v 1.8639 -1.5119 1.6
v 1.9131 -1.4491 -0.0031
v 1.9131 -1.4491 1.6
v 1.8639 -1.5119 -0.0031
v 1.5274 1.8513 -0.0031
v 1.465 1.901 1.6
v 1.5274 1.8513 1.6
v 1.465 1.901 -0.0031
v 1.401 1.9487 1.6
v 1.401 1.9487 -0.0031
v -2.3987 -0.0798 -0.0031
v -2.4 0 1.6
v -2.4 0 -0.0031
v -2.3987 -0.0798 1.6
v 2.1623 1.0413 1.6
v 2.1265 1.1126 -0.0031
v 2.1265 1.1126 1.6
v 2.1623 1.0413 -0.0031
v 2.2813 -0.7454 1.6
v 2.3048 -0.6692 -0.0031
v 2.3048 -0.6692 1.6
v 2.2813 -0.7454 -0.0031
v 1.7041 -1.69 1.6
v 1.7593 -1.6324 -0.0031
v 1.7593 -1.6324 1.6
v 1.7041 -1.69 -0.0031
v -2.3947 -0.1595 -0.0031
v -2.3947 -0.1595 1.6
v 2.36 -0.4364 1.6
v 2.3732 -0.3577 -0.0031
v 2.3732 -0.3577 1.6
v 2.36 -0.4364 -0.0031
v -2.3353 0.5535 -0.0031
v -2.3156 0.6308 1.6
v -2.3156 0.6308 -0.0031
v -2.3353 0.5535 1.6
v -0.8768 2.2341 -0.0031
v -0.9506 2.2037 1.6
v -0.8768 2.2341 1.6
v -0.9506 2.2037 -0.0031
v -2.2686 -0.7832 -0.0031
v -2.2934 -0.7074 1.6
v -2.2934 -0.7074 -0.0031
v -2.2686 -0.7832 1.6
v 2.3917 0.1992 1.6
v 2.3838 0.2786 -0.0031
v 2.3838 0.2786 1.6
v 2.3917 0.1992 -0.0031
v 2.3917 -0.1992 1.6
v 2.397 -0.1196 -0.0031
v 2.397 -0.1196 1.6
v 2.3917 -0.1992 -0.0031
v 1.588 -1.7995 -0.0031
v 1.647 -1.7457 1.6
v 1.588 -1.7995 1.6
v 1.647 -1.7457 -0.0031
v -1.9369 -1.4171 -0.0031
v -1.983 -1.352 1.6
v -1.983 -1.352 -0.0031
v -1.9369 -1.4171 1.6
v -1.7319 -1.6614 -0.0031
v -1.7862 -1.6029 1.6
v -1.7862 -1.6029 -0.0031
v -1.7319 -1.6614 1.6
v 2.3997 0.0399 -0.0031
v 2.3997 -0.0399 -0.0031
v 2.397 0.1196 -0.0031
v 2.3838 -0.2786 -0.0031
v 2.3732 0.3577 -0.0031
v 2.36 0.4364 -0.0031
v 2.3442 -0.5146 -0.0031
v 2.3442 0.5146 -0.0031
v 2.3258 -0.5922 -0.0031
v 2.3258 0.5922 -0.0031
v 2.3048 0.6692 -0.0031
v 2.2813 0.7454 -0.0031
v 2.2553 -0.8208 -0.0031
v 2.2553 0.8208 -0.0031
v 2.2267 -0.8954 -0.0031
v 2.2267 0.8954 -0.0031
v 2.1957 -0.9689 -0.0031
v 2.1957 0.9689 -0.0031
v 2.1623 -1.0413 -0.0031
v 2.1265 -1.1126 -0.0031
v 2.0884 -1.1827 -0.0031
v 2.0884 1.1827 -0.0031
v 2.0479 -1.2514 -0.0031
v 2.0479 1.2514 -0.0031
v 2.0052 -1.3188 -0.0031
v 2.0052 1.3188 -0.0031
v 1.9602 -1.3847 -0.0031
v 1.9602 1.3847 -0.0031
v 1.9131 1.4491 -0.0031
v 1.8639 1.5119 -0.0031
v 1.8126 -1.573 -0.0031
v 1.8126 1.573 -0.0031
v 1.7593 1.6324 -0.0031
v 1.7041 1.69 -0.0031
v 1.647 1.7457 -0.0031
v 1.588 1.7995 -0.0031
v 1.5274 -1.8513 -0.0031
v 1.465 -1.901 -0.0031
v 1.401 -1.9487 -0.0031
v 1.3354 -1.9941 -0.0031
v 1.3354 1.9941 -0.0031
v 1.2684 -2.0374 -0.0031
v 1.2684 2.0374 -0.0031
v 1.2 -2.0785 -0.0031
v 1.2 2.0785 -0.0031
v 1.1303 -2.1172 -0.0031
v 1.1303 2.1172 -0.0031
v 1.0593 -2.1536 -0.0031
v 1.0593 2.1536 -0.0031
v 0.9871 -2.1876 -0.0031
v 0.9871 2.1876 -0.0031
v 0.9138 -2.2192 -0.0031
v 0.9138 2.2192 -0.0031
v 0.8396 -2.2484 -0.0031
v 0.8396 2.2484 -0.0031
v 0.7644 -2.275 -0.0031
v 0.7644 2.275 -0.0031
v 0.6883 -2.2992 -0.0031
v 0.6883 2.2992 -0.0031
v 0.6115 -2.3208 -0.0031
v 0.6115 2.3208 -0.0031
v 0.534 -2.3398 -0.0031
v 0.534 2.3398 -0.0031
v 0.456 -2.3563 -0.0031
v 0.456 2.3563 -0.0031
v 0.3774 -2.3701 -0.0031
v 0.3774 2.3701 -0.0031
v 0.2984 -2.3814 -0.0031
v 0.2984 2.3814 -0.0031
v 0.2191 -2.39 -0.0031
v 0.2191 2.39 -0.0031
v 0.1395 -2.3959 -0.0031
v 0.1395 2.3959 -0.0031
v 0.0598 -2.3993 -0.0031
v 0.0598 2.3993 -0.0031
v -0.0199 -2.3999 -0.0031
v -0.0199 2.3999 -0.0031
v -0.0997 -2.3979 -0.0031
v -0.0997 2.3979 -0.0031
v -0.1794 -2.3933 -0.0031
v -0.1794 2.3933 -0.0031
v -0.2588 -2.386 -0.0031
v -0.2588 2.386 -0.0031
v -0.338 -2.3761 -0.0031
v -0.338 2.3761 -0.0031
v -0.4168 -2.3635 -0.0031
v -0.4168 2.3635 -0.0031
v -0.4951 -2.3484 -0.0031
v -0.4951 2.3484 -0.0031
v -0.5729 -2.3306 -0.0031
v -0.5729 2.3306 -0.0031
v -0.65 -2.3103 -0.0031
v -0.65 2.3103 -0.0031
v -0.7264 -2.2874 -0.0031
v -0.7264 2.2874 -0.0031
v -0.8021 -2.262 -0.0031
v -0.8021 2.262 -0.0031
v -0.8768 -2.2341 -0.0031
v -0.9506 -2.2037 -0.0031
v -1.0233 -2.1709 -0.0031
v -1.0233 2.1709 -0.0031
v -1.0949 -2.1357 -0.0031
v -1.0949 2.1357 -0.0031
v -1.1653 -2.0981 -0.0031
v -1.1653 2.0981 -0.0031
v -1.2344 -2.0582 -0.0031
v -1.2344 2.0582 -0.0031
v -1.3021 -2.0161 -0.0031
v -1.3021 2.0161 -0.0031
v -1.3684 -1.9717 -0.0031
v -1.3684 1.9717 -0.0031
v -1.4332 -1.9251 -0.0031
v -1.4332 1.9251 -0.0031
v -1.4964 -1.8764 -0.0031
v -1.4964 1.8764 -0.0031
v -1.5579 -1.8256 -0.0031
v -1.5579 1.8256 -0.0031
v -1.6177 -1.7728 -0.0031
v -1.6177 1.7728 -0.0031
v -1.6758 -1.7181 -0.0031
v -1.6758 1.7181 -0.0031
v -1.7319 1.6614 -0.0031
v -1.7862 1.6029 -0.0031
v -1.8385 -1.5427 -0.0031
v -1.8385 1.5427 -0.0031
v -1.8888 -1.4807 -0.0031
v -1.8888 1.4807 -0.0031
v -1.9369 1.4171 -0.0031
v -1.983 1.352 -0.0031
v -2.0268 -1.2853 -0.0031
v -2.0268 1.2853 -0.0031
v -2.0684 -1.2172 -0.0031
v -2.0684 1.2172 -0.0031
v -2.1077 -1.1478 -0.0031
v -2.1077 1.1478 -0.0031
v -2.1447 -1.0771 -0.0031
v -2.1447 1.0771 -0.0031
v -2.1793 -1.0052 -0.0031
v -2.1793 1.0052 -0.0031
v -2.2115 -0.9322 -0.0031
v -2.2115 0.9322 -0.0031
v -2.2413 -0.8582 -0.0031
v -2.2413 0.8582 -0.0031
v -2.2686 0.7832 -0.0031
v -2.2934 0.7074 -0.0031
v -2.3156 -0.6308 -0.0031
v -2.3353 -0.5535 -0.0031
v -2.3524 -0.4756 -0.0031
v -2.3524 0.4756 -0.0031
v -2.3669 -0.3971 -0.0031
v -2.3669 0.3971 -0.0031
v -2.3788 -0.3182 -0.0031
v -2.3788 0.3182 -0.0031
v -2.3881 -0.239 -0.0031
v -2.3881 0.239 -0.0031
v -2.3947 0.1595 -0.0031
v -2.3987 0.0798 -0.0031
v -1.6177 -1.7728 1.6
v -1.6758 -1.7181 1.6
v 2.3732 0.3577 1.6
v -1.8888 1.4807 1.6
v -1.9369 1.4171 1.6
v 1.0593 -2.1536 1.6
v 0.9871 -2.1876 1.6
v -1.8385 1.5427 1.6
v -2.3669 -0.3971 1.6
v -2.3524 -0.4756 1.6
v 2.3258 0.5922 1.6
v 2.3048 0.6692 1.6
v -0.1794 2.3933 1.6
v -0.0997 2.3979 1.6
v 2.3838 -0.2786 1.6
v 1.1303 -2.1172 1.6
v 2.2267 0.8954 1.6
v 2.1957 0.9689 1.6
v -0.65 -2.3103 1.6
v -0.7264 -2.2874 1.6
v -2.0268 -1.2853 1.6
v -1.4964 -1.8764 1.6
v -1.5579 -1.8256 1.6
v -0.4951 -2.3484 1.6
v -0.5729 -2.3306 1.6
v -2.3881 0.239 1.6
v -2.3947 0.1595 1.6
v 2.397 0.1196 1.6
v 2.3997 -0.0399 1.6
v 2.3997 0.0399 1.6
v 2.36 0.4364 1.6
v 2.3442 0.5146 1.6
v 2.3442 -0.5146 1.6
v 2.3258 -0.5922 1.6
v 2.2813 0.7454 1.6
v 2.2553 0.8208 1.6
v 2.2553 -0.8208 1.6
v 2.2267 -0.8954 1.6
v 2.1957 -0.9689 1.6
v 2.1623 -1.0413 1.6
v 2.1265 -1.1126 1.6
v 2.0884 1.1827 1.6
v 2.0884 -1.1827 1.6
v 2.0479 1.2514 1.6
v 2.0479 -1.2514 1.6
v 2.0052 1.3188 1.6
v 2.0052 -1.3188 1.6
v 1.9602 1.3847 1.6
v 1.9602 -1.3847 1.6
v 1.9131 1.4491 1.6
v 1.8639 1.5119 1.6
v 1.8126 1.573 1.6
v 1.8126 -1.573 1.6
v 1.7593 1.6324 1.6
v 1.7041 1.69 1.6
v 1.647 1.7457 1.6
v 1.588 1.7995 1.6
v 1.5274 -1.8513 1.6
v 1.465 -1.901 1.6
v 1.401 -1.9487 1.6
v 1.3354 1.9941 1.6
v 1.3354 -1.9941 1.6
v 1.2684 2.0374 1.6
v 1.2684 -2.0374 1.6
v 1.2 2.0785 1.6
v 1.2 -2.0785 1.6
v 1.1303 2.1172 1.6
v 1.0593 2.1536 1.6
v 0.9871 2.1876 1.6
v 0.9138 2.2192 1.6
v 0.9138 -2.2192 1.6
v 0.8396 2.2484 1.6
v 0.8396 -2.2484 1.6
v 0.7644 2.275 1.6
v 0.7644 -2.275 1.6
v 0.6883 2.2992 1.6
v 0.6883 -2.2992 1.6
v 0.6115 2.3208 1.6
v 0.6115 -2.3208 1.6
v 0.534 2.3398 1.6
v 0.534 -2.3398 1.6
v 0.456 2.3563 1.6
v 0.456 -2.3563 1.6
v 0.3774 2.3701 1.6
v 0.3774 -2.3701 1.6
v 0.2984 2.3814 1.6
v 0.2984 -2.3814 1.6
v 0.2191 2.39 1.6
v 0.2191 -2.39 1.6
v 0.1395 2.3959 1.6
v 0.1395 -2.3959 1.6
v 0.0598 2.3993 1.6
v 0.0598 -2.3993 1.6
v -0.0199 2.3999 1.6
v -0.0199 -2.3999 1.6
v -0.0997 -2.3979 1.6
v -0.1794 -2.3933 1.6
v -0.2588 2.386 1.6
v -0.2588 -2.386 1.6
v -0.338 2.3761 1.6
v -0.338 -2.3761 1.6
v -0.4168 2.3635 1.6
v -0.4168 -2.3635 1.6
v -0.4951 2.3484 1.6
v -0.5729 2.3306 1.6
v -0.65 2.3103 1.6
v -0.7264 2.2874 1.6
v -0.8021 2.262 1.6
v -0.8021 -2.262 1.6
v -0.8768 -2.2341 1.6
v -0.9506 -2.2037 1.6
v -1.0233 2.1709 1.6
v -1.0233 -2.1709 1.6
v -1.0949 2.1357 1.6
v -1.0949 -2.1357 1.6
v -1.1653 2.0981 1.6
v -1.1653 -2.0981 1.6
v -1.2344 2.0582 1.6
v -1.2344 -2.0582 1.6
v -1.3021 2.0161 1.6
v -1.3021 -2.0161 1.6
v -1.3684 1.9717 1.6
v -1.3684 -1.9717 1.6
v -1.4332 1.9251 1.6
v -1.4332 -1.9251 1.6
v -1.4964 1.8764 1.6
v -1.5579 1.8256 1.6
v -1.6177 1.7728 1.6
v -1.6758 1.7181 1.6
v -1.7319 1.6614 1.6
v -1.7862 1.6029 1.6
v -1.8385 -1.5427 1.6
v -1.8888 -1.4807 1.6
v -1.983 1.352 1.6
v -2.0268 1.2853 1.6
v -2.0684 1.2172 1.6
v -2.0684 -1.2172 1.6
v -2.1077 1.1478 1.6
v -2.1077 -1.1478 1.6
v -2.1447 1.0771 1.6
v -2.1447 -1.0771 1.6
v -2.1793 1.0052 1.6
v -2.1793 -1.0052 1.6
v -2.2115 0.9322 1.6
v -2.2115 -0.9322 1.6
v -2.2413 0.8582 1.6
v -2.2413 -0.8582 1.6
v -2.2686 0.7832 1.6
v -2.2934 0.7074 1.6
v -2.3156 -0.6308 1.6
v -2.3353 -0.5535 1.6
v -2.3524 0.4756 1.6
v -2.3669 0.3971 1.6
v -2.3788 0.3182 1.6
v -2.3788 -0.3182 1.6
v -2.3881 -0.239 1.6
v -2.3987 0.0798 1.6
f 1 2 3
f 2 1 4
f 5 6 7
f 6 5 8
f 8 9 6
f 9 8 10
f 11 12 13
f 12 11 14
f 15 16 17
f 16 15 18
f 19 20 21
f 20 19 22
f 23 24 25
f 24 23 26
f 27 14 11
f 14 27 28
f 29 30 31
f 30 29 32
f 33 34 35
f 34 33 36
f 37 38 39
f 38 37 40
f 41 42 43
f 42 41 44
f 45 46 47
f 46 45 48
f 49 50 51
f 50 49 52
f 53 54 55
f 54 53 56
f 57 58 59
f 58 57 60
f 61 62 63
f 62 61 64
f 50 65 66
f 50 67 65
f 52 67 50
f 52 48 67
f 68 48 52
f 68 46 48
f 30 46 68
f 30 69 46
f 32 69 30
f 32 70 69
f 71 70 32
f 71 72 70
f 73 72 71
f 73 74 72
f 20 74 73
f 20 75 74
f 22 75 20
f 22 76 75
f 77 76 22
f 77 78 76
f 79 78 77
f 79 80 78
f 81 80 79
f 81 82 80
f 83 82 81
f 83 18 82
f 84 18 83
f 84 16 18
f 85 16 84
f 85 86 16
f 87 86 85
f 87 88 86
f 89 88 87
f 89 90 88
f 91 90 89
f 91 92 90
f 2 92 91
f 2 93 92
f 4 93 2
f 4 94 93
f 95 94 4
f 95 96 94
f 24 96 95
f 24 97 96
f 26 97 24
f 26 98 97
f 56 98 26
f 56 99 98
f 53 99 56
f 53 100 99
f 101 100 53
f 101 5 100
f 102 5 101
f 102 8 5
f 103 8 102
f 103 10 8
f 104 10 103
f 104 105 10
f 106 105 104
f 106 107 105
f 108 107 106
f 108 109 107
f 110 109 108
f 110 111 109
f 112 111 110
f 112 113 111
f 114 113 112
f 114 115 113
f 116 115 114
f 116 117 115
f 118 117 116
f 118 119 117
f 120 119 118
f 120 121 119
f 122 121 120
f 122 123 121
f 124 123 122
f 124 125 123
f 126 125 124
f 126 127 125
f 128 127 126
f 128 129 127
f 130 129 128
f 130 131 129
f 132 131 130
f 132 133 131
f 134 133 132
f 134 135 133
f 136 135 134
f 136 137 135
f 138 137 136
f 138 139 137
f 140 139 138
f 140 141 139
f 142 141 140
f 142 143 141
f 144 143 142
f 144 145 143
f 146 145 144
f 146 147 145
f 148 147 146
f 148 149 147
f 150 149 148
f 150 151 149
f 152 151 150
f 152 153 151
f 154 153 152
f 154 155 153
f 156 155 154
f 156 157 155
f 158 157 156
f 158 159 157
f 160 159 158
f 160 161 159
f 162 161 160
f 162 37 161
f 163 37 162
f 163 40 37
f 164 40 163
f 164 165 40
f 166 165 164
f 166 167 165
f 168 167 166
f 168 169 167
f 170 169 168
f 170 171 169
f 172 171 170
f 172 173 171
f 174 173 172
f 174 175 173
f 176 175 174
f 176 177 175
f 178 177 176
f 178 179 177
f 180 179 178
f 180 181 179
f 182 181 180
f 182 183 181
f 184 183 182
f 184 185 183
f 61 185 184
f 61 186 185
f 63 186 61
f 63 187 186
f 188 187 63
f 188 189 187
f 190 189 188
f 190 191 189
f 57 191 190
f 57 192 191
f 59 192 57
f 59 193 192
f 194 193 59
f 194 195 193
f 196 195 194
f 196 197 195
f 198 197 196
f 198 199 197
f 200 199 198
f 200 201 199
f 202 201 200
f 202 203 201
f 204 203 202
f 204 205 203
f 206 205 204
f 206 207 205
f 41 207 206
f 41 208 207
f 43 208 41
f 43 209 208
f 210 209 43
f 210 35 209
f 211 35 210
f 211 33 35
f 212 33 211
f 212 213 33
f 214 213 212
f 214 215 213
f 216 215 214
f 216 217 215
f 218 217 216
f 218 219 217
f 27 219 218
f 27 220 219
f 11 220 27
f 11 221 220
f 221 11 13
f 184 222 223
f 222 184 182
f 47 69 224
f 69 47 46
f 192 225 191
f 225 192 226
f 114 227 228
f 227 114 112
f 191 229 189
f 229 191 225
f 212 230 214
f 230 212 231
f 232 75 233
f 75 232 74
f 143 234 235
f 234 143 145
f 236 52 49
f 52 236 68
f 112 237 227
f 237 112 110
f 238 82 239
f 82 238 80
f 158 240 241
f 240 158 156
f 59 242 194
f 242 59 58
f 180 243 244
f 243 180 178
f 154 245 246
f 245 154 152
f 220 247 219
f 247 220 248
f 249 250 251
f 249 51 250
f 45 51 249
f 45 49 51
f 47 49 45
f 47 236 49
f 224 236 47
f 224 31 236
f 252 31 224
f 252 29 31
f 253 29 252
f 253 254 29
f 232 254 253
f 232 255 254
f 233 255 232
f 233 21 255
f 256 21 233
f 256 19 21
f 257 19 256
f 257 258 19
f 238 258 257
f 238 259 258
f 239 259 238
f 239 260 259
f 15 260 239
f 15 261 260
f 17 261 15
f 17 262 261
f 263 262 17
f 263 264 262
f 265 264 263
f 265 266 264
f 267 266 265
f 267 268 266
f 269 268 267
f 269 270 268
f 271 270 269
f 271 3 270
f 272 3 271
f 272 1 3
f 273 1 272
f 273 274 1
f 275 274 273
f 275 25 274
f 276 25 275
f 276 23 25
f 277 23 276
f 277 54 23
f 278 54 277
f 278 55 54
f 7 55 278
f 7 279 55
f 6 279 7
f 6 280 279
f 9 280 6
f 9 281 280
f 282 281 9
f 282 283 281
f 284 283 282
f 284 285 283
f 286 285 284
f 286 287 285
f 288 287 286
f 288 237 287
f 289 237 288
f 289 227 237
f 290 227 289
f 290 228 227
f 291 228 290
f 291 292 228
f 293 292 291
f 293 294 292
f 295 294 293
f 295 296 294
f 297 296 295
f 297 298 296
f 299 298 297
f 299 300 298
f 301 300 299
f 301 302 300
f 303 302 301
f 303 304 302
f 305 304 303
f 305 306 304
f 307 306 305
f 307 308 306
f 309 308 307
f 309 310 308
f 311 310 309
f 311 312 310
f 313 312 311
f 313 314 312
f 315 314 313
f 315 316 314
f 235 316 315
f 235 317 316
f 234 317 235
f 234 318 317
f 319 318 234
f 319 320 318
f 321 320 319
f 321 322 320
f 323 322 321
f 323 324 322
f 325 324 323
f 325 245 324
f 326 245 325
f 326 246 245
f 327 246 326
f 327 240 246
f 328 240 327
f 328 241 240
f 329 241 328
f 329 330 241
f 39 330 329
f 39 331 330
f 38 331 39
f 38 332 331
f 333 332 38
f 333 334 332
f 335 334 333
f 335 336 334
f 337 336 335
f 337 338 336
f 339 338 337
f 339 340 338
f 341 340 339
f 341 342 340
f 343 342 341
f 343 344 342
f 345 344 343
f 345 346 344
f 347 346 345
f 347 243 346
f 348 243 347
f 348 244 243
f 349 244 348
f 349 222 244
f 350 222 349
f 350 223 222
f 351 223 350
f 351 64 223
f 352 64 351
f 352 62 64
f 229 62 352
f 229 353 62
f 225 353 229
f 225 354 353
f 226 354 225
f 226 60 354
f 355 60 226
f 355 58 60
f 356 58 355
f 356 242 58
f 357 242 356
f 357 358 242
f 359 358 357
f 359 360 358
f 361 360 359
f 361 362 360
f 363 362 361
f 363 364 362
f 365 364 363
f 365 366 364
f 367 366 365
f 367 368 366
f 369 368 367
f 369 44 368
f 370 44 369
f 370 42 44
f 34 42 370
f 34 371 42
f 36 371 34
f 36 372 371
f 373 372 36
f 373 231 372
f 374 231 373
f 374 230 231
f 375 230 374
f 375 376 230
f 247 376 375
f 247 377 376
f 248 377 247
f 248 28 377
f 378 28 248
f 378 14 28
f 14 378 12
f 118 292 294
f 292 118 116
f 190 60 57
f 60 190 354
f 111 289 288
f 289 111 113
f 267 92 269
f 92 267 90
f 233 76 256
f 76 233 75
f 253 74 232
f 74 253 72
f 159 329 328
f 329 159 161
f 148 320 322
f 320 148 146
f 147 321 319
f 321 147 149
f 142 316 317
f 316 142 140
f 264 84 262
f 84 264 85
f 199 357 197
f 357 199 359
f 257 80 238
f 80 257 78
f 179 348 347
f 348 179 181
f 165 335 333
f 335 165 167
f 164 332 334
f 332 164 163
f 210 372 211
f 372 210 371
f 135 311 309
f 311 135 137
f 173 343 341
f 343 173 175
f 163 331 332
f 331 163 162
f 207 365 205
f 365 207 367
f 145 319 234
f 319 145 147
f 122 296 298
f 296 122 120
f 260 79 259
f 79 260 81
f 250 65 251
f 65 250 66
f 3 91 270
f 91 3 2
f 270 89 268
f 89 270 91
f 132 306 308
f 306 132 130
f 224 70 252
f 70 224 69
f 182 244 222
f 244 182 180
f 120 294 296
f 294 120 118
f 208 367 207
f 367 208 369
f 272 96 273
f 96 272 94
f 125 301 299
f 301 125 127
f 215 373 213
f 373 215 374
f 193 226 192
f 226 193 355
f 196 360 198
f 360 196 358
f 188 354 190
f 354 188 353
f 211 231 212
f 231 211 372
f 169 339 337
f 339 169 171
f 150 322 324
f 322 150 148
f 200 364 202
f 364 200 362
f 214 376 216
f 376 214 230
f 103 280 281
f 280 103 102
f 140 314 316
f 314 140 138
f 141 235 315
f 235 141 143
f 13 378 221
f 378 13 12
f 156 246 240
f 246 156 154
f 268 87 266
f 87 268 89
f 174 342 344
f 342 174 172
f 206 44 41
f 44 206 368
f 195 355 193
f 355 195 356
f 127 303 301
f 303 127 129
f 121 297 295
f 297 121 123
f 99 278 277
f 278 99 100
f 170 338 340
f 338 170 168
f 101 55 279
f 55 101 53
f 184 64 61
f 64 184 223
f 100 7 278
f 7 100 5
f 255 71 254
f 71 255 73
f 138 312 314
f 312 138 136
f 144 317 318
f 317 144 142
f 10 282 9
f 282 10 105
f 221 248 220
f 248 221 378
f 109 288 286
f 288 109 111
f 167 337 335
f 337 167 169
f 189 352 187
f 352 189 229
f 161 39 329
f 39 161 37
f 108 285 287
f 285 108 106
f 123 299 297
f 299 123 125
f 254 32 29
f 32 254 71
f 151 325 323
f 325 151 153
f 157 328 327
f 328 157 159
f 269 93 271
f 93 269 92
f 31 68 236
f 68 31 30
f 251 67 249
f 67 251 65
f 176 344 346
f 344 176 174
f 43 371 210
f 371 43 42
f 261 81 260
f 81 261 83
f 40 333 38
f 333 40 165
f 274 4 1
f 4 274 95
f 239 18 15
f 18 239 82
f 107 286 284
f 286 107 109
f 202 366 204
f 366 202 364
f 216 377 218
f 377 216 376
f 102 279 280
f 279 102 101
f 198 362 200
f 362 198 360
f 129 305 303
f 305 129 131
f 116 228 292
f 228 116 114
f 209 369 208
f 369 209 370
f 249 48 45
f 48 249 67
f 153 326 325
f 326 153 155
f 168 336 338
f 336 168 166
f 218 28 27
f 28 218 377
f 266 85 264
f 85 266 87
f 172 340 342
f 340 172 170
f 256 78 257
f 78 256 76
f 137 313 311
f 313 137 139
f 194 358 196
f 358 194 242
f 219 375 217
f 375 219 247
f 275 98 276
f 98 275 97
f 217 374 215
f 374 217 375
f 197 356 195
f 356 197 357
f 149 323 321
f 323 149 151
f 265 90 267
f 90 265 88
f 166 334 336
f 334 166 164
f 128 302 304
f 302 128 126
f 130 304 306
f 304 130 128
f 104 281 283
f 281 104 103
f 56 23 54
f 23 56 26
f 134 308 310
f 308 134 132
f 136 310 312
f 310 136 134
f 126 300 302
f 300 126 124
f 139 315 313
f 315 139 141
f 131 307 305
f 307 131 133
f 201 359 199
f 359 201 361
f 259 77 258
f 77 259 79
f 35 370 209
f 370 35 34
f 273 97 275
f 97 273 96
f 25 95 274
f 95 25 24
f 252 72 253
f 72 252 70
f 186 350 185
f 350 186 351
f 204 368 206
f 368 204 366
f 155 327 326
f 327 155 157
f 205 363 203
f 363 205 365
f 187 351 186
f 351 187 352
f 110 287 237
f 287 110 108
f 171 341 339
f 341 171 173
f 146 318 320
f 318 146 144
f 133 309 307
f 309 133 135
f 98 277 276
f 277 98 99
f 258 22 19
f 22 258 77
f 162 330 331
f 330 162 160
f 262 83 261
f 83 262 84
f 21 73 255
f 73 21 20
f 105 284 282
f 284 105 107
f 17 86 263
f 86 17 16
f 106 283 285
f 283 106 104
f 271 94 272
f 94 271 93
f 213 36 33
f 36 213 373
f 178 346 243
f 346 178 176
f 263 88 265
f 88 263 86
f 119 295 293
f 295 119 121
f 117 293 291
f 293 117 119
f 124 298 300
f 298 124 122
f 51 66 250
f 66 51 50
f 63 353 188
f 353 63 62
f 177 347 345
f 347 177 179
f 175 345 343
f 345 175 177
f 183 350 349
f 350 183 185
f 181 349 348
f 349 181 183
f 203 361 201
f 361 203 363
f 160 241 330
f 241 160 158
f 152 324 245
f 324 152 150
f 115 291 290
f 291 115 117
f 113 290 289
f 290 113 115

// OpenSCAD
use <../lib.scad>
use <../p/box2-5.scad>
use <../p/box5.scad>
use <../p/rect2p.scad>
use <../p/recte3.scad>
use <../p/stud.scad>
use <../p/stud2a.scad>
use <../p/stud2s2.scad>
use <../p/stud2s2e.scad>
$fa=1; $fs=0.2;
function ldraw_lib__18759(realsolid=false) = [
// 0 Slope Brick 45  3 x  1 Inverted Double with Inner Stopper Rings
// 0 Name: 18759.dat
// 0 Author: Owen Burgoyne [C3POwen]
// 0 !LDRAW_ORG Part UPDATE 2016-01
// 0 !LICENSE Licensed under CC BY 2.0 and CC BY 4.0 : see CAreadme.txt
// 
// 0 BFC CERTIFY CCW
  [0,"BFC","CERTIFY"],
  [0,"BFC","CCW"],
// 
// 0 !HISTORY 2016-12-31 [PTadmin] Official Update 2016-01
// 
// 
// 1 16 0 12 20 10 0 0 0 2 -10 0 0 10 box2-5.dat
  [1,16,0,12,20,10,0,0,0,2,-10,0,0,10, ldraw_lib__box2_5(realsolid)],
// 0 BFC INVERTNEXT
  [0,"BFC","INVERTNEXT"],
// 1 16 0 10 18 8 0 0 0 2 -8 0 0 8 box2-5.dat
  [1,16,0,10,18,8,0,0,0,2,-8,0,0,8, ldraw_lib__box2_5(realsolid)],
// 4 16 -8 20 10 -8 4 26 -8 0 26 -8 0 10
  [4,16,-8,20,10,-8,4,26,-8,0,26,-8,0,10],
// 4 16 8 20 10 8 0 10 8 0 26 8 4 26
  [4,16,8,20,10,8,0,10,8,0,26,8,4,26],
// 1 16 0 10 10 0 0 8 10 0 0 0 -1 0 rect2p.dat
  [1,16,0,10,10,0,0,8,10,0,0,0,-1,0, ldraw_lib__rect2p(realsolid)],
// 1 16 0 0 18 8 0 0 0 1 0 0 0 -8 recte3.dat
  [1,16,0,0,18,8,0,0,0,1,0,0,0,-8, ldraw_lib__recte3(realsolid)],
// 4 16 10 24 10 6 24 6 -6 24 6 -10 24 10
  [4,16,10,24,10,6,24,6,-6,24,6,-10,24,10],
// 4 16 -10 24 10 -6 24 6 -6 24 -6 -10 24 -10
  [4,16,-10,24,10,-6,24,6,-6,24,-6,-10,24,-10],
// 4 16 -10 24 -10 -6 24 -6 6 24 -6 10 24 -10
  [4,16,-10,24,-10,-6,24,-6,6,24,-6,10,24,-10],
// 4 16 10 24 -10 6 24 -6 6 24 6 10 24 10
  [4,16,10,24,-10,6,24,-6,6,24,6,10,24,10],
// 2 24 -10 24 10 -10 24 -10
  [2,24,-10,24,10,-10,24,-10],
// 2 24 10 24 10 10 24 -10
  [2,24,10,24,10,10,24,-10],
// 0 BFC INVERTNEXT
  [0,"BFC","INVERTNEXT"],
// 1 16 0 24 0 6 0 0 0 -20 0 0 0 6 box5.dat
  [1,16,0,24,0,6,0,0,0,-20,0,0,0,6, ldraw_lib__box5(realsolid)],
// 1 16 0 10 -10 0 0 8 10 0 0 0 1 0 rect2p.dat
  [1,16,0,10,-10,0,0,8,10,0,0,0,1,0, ldraw_lib__rect2p(realsolid)],
// 4 16 -8 20 -10 -8 0 -10 -8 0 -26 -8 4 -26
  [4,16,-8,20,-10,-8,0,-10,-8,0,-26,-8,4,-26],
// 4 16 8 20 -10 8 4 -26 8 0 -26 8 0 -10
  [4,16,8,20,-10,8,4,-26,8,0,-26,8,0,-10],
// 1 16 0 0 -18 8 0 0 0 1 0 0 0 8 recte3.dat
  [1,16,0,0,-18,8,0,0,0,1,0,0,0,8, ldraw_lib__recte3(realsolid)],
// 0 BFC INVERTNEXT
  [0,"BFC","INVERTNEXT"],
// 1 16 0 10 -18 -8 0 0 0 2 -8 0 0 -8 box2-5.dat
  [1,16,0,10,-18,-8,0,0,0,2,-8,0,0,-8, ldraw_lib__box2_5(realsolid)],
// 1 16 0 12 -20 -10 0 0 0 2 -10 0 0 -10 box2-5.dat
  [1,16,0,12,-20,-10,0,0,0,2,-10,0,0,-10, ldraw_lib__box2_5(realsolid)],
// 4 16 -10 24 -10 -10 4 -30 -10 4 30 -10 24 10
  [4,16,-10,24,-10,-10,4,-30,-10,4,30,-10,24,10],
// 4 16 -10 4 -30 -10 0 -30 -10 0 30 -10 4 30
  [4,16,-10,4,-30,-10,0,-30,-10,0,30,-10,4,30],
// 2 24 -10 0 30 -10 0 -30
  [2,24,-10,0,30,-10,0,-30],
// 4 16 10 24 -10 10 24 10 10 4 30 10 4 -30
  [4,16,10,24,-10,10,24,10,10,4,30,10,4,-30],
// 4 16 10 4 -30 10 4 30 10 0 30 10 0 -30
  [4,16,10,4,-30,10,4,30,10,0,30,10,0,-30],
// 2 24 10 0 30 10 0 -30
  [2,24,10,0,30,10,0,-30],
// 3 16 -10 0 -30 -8 0 -26 -8 0 -10
  [3,16,-10,0,-30,-8,0,-26,-8,0,-10],
// 4 16 -10 0 30 -10 0 -30 -8 0 -10 -8 0 10
  [4,16,-10,0,30,-10,0,-30,-8,0,-10,-8,0,10],
// 4 16 -8 0 10 -8 0 -10 8 0 -10 8 0 10
  [4,16,-8,0,10,-8,0,-10,8,0,-10,8,0,10],
// 3 16 -10 0 30 -8 0 10 -8 0 26
  [3,16,-10,0,30,-8,0,10,-8,0,26],
// 4 16 10 0 30 -10 0 30 -8 0 26 8 0 26
  [4,16,10,0,30,-10,0,30,-8,0,26,8,0,26],
// 3 16 10 0 30 8 0 26 8 0 10
  [3,16,10,0,30,8,0,26,8,0,10],
// 4 16 10 0 -30 10 0 30 8 0 10 8 0 -10
  [4,16,10,0,-30,10,0,30,8,0,10,8,0,-10],
// 3 16 10 0 -30 8 0 -10 8 0 -26
  [3,16,10,0,-30,8,0,-10,8,0,-26],
// 4 16 -10 0 -30 10 0 -30 8 0 -26 -8 0 -26
  [4,16,-10,0,-30,10,0,-30,8,0,-26,-8,0,-26],
// 
// 1 16 0 4 20 0 0 1 0 6 0 1 0 0 stud2s2.dat
  [1,16,0,4,20,0,0,1,0,6,0,1,0,0, ldraw_lib__stud2s2(realsolid)],
// 1 16 0 0 20 0 0 1 0 4 0 1 0 0 stud2s2e.dat
  [1,16,0,0,20,0,0,1,0,4,0,1,0,0, ldraw_lib__stud2s2e(realsolid)],
// 1 16 0 0 20 1 0 0 0 1 0 0 0 1 stud2a.dat
  [1,16,0,0,20,1,0,0,0,1,0,0,0,1, ldraw_lib__stud2a(realsolid)],
// 1 16 0 0 0 0 0 1 0 1 0 -1 0 0 stud.dat
  [1,16,0,0,0,0,0,1,0,1,0,-1,0,0, ldraw_lib__stud(realsolid)],
// 1 16 0 4 -20 0 0 1 0 6 0 -1 0 0 stud2s2.dat
  [1,16,0,4,-20,0,0,1,0,6,0,-1,0,0, ldraw_lib__stud2s2(realsolid)],
// 1 16 0 0 -20 0 0 1 0 4 0 -1 0 0 stud2s2e.dat
  [1,16,0,0,-20,0,0,1,0,4,0,-1,0,0, ldraw_lib__stud2s2e(realsolid)],
// 1 16 0 0 -20 1 0 0 0 1 0 0 0 1 stud2a.dat
  [1,16,0,0,-20,1,0,0,0,1,0,0,0,1, ldraw_lib__stud2a(realsolid)],
];
module ldraw_lib__18759(step=0, col=false, unit=2/5, alt=false, line=0.2, solid=!$preview)
    makepoly(ldraw_lib__18759(solid), step=step, col=col, unit=unit, alt=alt, line=line, solid=solid);
ldraw_lib__18759(line=0.2);
